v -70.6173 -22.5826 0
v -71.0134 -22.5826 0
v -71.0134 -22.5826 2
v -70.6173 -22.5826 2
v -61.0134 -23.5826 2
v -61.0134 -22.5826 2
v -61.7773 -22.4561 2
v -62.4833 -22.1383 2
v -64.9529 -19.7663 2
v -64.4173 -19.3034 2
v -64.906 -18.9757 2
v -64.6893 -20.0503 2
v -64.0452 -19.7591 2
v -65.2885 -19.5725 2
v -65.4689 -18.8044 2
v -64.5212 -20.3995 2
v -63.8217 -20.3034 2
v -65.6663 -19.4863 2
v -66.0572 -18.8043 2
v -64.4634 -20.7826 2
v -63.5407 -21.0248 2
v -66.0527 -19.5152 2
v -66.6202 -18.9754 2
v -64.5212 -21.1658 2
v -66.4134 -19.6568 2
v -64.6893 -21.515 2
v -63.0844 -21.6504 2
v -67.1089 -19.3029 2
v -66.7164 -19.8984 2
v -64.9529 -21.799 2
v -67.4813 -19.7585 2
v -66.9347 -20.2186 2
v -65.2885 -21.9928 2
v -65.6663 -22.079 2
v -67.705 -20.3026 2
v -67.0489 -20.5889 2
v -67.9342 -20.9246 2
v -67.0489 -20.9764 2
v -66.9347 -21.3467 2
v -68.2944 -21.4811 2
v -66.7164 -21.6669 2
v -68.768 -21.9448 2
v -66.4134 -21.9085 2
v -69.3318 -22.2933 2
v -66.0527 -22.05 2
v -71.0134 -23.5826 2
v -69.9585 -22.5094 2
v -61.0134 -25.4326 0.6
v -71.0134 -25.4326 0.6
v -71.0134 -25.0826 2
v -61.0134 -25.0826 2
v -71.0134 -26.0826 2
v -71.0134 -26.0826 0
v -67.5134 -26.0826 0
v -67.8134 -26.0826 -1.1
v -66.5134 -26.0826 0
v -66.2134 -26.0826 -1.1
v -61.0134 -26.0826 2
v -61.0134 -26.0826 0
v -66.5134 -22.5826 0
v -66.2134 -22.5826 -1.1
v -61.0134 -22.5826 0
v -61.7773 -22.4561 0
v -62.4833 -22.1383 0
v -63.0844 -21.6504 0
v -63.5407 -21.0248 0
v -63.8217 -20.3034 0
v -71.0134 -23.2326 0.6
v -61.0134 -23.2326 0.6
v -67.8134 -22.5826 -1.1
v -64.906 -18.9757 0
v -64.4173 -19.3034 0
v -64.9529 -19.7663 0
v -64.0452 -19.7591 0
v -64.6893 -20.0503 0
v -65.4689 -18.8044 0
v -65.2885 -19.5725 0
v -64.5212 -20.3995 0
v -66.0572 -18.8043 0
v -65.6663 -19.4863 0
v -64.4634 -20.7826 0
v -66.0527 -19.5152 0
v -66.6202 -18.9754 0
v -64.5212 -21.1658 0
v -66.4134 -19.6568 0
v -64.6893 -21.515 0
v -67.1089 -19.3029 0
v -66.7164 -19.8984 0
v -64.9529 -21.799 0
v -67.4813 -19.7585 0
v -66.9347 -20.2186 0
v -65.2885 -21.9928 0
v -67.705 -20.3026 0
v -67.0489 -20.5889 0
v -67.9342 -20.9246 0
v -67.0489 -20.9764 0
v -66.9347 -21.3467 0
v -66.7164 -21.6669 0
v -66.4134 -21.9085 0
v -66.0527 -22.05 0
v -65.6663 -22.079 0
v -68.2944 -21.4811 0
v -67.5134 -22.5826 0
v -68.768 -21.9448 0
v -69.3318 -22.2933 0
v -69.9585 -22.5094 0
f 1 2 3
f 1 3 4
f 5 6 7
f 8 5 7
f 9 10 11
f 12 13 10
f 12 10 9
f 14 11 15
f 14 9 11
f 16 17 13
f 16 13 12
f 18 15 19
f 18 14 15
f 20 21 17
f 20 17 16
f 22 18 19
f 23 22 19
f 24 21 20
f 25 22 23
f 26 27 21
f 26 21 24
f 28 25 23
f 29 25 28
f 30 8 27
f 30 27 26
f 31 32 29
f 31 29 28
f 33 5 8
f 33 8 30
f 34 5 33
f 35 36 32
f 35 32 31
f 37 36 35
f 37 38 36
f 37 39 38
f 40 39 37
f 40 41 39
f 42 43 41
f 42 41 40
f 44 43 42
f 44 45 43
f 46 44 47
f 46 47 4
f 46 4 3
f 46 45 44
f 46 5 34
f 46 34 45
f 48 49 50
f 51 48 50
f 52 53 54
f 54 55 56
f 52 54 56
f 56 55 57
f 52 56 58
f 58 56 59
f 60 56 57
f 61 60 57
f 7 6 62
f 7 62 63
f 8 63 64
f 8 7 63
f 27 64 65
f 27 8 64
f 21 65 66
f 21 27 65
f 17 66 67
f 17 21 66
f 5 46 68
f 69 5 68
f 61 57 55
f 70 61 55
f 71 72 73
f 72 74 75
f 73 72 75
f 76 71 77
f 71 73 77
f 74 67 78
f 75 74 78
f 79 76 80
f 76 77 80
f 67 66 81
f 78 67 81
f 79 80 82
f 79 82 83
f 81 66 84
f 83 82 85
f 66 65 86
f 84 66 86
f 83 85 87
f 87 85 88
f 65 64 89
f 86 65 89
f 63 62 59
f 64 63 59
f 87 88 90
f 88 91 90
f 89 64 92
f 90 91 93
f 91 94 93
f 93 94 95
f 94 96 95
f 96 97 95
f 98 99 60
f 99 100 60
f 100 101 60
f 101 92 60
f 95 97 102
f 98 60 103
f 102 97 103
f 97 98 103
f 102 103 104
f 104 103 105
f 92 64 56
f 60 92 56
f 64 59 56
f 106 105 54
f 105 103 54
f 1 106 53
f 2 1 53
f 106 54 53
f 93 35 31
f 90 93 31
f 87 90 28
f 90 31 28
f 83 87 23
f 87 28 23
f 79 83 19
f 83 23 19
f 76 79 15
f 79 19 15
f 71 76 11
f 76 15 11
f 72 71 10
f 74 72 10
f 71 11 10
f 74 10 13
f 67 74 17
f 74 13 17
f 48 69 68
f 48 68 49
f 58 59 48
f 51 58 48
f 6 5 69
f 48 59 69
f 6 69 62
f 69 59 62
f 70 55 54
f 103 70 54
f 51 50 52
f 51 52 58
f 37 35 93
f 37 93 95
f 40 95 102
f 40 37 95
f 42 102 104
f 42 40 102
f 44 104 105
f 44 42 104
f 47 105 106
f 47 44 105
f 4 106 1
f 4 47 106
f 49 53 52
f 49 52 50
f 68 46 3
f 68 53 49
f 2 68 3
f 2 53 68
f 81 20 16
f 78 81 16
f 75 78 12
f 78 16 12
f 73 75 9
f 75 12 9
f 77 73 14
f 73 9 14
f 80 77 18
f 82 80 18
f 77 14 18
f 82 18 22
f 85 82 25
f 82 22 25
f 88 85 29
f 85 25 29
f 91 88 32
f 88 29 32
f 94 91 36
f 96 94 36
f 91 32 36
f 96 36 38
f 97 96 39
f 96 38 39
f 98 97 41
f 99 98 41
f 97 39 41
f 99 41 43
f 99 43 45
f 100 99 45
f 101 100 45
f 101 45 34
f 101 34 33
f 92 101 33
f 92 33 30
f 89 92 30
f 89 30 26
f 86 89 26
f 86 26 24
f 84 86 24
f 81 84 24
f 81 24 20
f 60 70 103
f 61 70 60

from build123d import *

# Parameters (mm, degrees)
ESQUISSE1_W             = 10
ESQUISSE1_H             = 3.5
BOSS_EXTRU_1_DEPTH      = 2
ENL_V_MAT_EXTRU_1_DEPTH = 29.00542817
BOSS_EXTRU_2_DEPTH      = 3.5
BOSS_EXTRU_3_DEPTH      = 2
ENL_V_MAT_EXTRU_2_REACH = 77.715
ESQUISSE5_R             = 1.3
CONG_1_R                = 3


with BuildPart() as part:
    # Esquisse1 → Boss.-Extru.1 (new body)
    with BuildSketch(Plane.XY):
        with Locations((-66.013415918, -24.332638037)):
            Rectangle(ESQUISSE1_W, ESQUISSE1_H)
    extrude(amount=BOSS_EXTRU_1_DEPTH)

    # Esquisse2 → Enlèv. mat.-Extru.1 (cut, through all)
    with BuildSketch(Plane.ZY.offset(71.013415918)):
        Polygon((2, -25.082638037), (2, -23.582638037), (0.6, -23.232638037), (0.6, -25.432638037), align=None)
    extrude(amount=-ENL_V_MAT_EXTRU_1_DEPTH, mode=Mode.SUBTRACT)

    # Esquisse3 → Boss.-Extru.2 (add)
    with BuildSketch(Plane.XZ.offset(26.082638037)):
        Polygon((-66.513415918, 0), (-66.213415918, -1.1), (-67.813415918, -1.1), (-67.513415918, 0), align=None)
    extrude(amount=-BOSS_EXTRU_2_DEPTH)

    # Esquisse4 → Boss.-Extru.3 (add)
    with BuildSketch(Plane.XY.offset(2)):
        with BuildLine():
            Line((-64.891636129, -22.582638037), (-66.635195707, -22.582638037))
            ThreePointArc((-66.635195707, -22.582638037), (-65.763415918, -18.782638037), (-64.891636129, -22.582638037))
        make_face()
    extrude(amount=-BOSS_EXTRU_3_DEPTH)

    # Esquisse5 → Enlèv. mat.-Extru.2 (cut, up to next)
    with BuildSketch(Plane.XY.offset(2), mode=Mode.PRIVATE) as enl_v_mat_extru_2_sk1:
        with Locations((-65.763415918, -20.782638037)):
            Circle(ESQUISSE5_R)
    enl_v_mat_extru_2_tool1 = extrude(enl_v_mat_extru_2_sk1.sketch, amount=-ENL_V_MAT_EXTRU_2_REACH, mode=Mode.PRIVATE) & part.part
    add(enl_v_mat_extru_2_tool1.solids().sort_by_distance((-65.763416, -20.782638, 2))[0], mode=Mode.SUBTRACT)

    # Congé1
    # the kernel refuses this fillet: 3 mm, written as the material it adds along each edge
    with BuildSketch(Plane(origin=(-66.635195707, -22.582638037, 2), x_dir=(-1, 0, 0), z_dir=(0, 0, -1))) as cong_1_piece_1:
        with BuildLine():
            CenterArc((3.982084651, 3), CONG_1_R, 193.886540363, 76.113459637)
            Line((1.069765987, 2.28), (1.011519614, 2.2656))
            ThreePointArc((1.011519614, 2.2656), (0.884509664, 0.975956702), (-0.026153394, 0.054))
            Line((-0.026153394, 0.054), (0, -0.06))
            Line((0, -0.06), (3.982084651, -0.06))
            Line((3.982084651, -0.06), (3.982084651, 0))
        make_face()
    extrude(amount=2)
    with BuildSketch(Plane(origin=(-64.891636129, -22.582638037, 2), x_dir=(1, 0, 0), z_dir=(0, 0, -1))) as cong_1_piece_2:
        with BuildLine():
            CenterArc((3.982532775, -2.998185933), CONG_1_R, 91.99262488, 74.142247301)
            Line((1.069945237, -2.279274373), (1.011693486, -2.264896142))
            ThreePointArc((1.011693486, -2.264896142), (0.884355653, -0.975628536), (-0.026153394, -0.054))
            Line((-0.026153394, -0.054), (0, 0.06))
            ThreePointArc((0, 0.06), (1.939110106, 0.06), (3.87613396, 0.059963719))
            Line((3.87613396, 0.059963719), (3.878220211, 0))
        make_face()
    extrude(amount=2)


solid = part.part
